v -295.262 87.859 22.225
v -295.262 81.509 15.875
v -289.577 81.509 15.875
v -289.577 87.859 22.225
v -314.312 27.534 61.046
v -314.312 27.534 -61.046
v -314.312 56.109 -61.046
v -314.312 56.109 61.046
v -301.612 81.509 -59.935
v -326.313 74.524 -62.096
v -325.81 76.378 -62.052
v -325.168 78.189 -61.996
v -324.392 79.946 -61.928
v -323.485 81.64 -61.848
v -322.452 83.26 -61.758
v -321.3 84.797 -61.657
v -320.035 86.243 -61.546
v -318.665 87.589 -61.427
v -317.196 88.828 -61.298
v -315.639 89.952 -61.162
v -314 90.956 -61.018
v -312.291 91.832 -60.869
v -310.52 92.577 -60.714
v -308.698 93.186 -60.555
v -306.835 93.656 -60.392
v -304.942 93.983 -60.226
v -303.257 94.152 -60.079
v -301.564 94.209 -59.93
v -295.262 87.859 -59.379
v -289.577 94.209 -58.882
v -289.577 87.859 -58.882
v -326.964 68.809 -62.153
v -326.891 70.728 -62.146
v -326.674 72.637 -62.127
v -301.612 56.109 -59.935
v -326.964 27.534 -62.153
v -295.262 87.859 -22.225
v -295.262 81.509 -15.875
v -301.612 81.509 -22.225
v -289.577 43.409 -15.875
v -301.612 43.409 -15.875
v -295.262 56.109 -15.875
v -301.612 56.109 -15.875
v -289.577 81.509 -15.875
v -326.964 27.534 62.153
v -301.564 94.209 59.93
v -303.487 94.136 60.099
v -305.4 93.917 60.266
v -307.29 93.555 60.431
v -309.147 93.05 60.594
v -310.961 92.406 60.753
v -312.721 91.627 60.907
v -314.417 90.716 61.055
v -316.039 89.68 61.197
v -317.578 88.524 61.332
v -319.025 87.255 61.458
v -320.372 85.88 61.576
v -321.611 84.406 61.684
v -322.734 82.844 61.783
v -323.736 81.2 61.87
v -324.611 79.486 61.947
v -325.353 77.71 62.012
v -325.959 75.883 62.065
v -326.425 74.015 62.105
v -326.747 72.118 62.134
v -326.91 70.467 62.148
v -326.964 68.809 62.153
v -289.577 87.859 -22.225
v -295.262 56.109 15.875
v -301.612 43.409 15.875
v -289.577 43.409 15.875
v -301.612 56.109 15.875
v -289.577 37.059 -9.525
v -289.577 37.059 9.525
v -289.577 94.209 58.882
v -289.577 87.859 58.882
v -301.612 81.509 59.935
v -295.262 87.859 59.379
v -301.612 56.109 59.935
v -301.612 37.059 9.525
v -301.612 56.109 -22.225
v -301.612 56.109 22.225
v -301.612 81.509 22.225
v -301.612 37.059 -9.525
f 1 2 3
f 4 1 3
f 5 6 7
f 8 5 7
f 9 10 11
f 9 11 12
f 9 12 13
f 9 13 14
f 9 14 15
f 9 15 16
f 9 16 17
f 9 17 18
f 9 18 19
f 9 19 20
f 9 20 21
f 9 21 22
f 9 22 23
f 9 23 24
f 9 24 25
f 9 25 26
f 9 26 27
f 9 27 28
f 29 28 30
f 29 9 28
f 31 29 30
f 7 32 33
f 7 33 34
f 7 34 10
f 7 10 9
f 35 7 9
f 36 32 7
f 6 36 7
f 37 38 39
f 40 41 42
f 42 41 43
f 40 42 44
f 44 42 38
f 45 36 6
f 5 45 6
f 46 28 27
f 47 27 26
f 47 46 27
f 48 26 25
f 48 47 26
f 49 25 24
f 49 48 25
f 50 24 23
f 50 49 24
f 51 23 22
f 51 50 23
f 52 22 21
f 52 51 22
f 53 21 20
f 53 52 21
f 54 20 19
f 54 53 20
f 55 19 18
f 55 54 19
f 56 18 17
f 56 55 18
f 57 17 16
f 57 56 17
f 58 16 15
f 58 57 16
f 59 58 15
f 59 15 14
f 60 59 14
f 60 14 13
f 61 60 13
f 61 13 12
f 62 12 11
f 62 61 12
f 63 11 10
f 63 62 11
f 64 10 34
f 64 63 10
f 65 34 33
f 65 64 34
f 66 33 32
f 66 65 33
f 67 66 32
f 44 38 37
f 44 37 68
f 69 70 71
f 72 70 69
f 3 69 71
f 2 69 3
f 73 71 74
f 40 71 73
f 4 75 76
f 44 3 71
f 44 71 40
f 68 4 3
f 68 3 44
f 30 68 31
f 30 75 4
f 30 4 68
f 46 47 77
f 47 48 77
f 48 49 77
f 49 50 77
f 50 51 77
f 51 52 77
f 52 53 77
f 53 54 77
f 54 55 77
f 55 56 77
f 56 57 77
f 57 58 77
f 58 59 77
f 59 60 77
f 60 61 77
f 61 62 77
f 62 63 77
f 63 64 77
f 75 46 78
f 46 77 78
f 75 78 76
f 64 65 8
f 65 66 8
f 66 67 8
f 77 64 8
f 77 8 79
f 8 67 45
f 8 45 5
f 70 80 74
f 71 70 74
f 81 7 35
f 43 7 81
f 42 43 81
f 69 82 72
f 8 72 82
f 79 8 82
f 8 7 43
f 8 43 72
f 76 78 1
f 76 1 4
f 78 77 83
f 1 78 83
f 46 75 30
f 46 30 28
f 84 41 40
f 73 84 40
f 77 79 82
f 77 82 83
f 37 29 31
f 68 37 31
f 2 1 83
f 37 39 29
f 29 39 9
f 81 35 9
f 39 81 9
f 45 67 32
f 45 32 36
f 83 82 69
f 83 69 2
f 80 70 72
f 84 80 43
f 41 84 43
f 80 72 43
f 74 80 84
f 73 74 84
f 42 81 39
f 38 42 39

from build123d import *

# Parameters (mm, degrees)
BOSS_EXTRUDE1_START       = -62.152648455
BOSS_EXTRUDE1_DEPTH       = 62.152648455
BOSS_EXTRUDE1_START_2     = 33.419354119
BOSS_EXTRUDE1_2_OUTLINE_W = 41
BOSS_EXTRUDE1_2_OUTLINE_H = 70
BOSS_EXTRUDE1_2_DEPTH     = 4.580645881
SKETCH2_W                 = 31.75
SKETCH2_H                 = 50.8
BOSS_EXTRUDE2_DEPTH       = 12.035499154
CHAMFER1_SIZE             = 6.35


with BuildPart() as part:
    # Boss-Extrude1: read off the stored shape, not the designer's step
    # Boss-Extrude1 outline → Boss-Extrude1 (new body)
    with BuildSketch(Plane.XY.offset(BOSS_EXTRUDE1_START)):
        with BuildLine():
            Line((-301.612263914, 87.858595148), (-289.57676476, 87.858595148))
            Line((-289.57676476, 87.858595148), (-289.57676476, 94.208595148))
            Line((-289.57676476, 94.208595148), (-301.56393658, 94.208595148))
            ThreePointArc((-301.56393658, 94.208595148), (-319.524448822, 86.76910739), (-326.96393658, 68.808595148))
            Line((-326.96393658, 68.808595148), (-326.96393658, 27.533595148))
            Line((-326.96393658, 27.533595148), (-314.312263914, 27.533595148))
            Line((-314.312263914, 27.533595148), (-314.312263914, 56.108595148))
            Line((-314.312263914, 56.108595148), (-301.612263914, 56.108595148))
            Line((-301.612263914, 56.108595148), (-301.612263914, 87.858595148))
        make_face()
    boss_extrude1 = extrude(amount=BOSS_EXTRUDE1_DEPTH)

    # Boss-Extrude1 2 outline → Boss-Extrude1 2 (cut)
    with BuildSketch(Plane(origin=(0, 0, 0), x_dir=(0.9961946980917454, 0, 0.08715574274765814), z_dir=(0.08715574274765815, 0, -0.9961946980917455)).offset(BOSS_EXTRUDE1_START_2)):
        with Locations((-312.5, -61)):
            Rectangle(BOSS_EXTRUDE1_2_OUTLINE_W, BOSS_EXTRUDE1_2_OUTLINE_H)
    boss_extrude1_2 = extrude(amount=BOSS_EXTRUDE1_2_DEPTH, mode=Mode.SUBTRACT)

    # Mirror1: Boss-Extrude1, Boss-Extrude1 2 across plane
    add(boss_extrude1.mirror(Plane.XY))
    add(boss_extrude1_2.mirror(Plane.XY), mode=Mode.SUBTRACT)

    # Sketch2 → Boss-Extrude2 (add)
    with BuildSketch(Plane(origin=(-301.612263914, 0, 0), x_dir=(0, 0, -1), z_dir=(1, 0, 0))):
        with Locations((0, 62.458595148)):
            Rectangle(SKETCH2_W, SKETCH2_H)
    extrude(amount=BOSS_EXTRUDE2_DEPTH)

    # Chamfer1
    chamfer1_edges = [part.edges().sort_by_distance(p)[0] for p in [
        (-295.594514337, 37.058595148, -15.875),
        (-295.594514337, 37.058595148, 15.875),
        (-295.594514337, 87.858595148, 15.875),
        (-301.612263914, 87.858595148, 37.904832248),
        (-301.612263914, 71.983595148, 15.875),
        (-295.594514337, 87.858595148, -15.875),
        (-301.612263914, 71.983595148, -15.875),
        (-301.612263914, 87.858595148, -37.904832248),
    ]]
    chamfer(chamfer1_edges, length=CHAMFER1_SIZE)


solid = part.part
